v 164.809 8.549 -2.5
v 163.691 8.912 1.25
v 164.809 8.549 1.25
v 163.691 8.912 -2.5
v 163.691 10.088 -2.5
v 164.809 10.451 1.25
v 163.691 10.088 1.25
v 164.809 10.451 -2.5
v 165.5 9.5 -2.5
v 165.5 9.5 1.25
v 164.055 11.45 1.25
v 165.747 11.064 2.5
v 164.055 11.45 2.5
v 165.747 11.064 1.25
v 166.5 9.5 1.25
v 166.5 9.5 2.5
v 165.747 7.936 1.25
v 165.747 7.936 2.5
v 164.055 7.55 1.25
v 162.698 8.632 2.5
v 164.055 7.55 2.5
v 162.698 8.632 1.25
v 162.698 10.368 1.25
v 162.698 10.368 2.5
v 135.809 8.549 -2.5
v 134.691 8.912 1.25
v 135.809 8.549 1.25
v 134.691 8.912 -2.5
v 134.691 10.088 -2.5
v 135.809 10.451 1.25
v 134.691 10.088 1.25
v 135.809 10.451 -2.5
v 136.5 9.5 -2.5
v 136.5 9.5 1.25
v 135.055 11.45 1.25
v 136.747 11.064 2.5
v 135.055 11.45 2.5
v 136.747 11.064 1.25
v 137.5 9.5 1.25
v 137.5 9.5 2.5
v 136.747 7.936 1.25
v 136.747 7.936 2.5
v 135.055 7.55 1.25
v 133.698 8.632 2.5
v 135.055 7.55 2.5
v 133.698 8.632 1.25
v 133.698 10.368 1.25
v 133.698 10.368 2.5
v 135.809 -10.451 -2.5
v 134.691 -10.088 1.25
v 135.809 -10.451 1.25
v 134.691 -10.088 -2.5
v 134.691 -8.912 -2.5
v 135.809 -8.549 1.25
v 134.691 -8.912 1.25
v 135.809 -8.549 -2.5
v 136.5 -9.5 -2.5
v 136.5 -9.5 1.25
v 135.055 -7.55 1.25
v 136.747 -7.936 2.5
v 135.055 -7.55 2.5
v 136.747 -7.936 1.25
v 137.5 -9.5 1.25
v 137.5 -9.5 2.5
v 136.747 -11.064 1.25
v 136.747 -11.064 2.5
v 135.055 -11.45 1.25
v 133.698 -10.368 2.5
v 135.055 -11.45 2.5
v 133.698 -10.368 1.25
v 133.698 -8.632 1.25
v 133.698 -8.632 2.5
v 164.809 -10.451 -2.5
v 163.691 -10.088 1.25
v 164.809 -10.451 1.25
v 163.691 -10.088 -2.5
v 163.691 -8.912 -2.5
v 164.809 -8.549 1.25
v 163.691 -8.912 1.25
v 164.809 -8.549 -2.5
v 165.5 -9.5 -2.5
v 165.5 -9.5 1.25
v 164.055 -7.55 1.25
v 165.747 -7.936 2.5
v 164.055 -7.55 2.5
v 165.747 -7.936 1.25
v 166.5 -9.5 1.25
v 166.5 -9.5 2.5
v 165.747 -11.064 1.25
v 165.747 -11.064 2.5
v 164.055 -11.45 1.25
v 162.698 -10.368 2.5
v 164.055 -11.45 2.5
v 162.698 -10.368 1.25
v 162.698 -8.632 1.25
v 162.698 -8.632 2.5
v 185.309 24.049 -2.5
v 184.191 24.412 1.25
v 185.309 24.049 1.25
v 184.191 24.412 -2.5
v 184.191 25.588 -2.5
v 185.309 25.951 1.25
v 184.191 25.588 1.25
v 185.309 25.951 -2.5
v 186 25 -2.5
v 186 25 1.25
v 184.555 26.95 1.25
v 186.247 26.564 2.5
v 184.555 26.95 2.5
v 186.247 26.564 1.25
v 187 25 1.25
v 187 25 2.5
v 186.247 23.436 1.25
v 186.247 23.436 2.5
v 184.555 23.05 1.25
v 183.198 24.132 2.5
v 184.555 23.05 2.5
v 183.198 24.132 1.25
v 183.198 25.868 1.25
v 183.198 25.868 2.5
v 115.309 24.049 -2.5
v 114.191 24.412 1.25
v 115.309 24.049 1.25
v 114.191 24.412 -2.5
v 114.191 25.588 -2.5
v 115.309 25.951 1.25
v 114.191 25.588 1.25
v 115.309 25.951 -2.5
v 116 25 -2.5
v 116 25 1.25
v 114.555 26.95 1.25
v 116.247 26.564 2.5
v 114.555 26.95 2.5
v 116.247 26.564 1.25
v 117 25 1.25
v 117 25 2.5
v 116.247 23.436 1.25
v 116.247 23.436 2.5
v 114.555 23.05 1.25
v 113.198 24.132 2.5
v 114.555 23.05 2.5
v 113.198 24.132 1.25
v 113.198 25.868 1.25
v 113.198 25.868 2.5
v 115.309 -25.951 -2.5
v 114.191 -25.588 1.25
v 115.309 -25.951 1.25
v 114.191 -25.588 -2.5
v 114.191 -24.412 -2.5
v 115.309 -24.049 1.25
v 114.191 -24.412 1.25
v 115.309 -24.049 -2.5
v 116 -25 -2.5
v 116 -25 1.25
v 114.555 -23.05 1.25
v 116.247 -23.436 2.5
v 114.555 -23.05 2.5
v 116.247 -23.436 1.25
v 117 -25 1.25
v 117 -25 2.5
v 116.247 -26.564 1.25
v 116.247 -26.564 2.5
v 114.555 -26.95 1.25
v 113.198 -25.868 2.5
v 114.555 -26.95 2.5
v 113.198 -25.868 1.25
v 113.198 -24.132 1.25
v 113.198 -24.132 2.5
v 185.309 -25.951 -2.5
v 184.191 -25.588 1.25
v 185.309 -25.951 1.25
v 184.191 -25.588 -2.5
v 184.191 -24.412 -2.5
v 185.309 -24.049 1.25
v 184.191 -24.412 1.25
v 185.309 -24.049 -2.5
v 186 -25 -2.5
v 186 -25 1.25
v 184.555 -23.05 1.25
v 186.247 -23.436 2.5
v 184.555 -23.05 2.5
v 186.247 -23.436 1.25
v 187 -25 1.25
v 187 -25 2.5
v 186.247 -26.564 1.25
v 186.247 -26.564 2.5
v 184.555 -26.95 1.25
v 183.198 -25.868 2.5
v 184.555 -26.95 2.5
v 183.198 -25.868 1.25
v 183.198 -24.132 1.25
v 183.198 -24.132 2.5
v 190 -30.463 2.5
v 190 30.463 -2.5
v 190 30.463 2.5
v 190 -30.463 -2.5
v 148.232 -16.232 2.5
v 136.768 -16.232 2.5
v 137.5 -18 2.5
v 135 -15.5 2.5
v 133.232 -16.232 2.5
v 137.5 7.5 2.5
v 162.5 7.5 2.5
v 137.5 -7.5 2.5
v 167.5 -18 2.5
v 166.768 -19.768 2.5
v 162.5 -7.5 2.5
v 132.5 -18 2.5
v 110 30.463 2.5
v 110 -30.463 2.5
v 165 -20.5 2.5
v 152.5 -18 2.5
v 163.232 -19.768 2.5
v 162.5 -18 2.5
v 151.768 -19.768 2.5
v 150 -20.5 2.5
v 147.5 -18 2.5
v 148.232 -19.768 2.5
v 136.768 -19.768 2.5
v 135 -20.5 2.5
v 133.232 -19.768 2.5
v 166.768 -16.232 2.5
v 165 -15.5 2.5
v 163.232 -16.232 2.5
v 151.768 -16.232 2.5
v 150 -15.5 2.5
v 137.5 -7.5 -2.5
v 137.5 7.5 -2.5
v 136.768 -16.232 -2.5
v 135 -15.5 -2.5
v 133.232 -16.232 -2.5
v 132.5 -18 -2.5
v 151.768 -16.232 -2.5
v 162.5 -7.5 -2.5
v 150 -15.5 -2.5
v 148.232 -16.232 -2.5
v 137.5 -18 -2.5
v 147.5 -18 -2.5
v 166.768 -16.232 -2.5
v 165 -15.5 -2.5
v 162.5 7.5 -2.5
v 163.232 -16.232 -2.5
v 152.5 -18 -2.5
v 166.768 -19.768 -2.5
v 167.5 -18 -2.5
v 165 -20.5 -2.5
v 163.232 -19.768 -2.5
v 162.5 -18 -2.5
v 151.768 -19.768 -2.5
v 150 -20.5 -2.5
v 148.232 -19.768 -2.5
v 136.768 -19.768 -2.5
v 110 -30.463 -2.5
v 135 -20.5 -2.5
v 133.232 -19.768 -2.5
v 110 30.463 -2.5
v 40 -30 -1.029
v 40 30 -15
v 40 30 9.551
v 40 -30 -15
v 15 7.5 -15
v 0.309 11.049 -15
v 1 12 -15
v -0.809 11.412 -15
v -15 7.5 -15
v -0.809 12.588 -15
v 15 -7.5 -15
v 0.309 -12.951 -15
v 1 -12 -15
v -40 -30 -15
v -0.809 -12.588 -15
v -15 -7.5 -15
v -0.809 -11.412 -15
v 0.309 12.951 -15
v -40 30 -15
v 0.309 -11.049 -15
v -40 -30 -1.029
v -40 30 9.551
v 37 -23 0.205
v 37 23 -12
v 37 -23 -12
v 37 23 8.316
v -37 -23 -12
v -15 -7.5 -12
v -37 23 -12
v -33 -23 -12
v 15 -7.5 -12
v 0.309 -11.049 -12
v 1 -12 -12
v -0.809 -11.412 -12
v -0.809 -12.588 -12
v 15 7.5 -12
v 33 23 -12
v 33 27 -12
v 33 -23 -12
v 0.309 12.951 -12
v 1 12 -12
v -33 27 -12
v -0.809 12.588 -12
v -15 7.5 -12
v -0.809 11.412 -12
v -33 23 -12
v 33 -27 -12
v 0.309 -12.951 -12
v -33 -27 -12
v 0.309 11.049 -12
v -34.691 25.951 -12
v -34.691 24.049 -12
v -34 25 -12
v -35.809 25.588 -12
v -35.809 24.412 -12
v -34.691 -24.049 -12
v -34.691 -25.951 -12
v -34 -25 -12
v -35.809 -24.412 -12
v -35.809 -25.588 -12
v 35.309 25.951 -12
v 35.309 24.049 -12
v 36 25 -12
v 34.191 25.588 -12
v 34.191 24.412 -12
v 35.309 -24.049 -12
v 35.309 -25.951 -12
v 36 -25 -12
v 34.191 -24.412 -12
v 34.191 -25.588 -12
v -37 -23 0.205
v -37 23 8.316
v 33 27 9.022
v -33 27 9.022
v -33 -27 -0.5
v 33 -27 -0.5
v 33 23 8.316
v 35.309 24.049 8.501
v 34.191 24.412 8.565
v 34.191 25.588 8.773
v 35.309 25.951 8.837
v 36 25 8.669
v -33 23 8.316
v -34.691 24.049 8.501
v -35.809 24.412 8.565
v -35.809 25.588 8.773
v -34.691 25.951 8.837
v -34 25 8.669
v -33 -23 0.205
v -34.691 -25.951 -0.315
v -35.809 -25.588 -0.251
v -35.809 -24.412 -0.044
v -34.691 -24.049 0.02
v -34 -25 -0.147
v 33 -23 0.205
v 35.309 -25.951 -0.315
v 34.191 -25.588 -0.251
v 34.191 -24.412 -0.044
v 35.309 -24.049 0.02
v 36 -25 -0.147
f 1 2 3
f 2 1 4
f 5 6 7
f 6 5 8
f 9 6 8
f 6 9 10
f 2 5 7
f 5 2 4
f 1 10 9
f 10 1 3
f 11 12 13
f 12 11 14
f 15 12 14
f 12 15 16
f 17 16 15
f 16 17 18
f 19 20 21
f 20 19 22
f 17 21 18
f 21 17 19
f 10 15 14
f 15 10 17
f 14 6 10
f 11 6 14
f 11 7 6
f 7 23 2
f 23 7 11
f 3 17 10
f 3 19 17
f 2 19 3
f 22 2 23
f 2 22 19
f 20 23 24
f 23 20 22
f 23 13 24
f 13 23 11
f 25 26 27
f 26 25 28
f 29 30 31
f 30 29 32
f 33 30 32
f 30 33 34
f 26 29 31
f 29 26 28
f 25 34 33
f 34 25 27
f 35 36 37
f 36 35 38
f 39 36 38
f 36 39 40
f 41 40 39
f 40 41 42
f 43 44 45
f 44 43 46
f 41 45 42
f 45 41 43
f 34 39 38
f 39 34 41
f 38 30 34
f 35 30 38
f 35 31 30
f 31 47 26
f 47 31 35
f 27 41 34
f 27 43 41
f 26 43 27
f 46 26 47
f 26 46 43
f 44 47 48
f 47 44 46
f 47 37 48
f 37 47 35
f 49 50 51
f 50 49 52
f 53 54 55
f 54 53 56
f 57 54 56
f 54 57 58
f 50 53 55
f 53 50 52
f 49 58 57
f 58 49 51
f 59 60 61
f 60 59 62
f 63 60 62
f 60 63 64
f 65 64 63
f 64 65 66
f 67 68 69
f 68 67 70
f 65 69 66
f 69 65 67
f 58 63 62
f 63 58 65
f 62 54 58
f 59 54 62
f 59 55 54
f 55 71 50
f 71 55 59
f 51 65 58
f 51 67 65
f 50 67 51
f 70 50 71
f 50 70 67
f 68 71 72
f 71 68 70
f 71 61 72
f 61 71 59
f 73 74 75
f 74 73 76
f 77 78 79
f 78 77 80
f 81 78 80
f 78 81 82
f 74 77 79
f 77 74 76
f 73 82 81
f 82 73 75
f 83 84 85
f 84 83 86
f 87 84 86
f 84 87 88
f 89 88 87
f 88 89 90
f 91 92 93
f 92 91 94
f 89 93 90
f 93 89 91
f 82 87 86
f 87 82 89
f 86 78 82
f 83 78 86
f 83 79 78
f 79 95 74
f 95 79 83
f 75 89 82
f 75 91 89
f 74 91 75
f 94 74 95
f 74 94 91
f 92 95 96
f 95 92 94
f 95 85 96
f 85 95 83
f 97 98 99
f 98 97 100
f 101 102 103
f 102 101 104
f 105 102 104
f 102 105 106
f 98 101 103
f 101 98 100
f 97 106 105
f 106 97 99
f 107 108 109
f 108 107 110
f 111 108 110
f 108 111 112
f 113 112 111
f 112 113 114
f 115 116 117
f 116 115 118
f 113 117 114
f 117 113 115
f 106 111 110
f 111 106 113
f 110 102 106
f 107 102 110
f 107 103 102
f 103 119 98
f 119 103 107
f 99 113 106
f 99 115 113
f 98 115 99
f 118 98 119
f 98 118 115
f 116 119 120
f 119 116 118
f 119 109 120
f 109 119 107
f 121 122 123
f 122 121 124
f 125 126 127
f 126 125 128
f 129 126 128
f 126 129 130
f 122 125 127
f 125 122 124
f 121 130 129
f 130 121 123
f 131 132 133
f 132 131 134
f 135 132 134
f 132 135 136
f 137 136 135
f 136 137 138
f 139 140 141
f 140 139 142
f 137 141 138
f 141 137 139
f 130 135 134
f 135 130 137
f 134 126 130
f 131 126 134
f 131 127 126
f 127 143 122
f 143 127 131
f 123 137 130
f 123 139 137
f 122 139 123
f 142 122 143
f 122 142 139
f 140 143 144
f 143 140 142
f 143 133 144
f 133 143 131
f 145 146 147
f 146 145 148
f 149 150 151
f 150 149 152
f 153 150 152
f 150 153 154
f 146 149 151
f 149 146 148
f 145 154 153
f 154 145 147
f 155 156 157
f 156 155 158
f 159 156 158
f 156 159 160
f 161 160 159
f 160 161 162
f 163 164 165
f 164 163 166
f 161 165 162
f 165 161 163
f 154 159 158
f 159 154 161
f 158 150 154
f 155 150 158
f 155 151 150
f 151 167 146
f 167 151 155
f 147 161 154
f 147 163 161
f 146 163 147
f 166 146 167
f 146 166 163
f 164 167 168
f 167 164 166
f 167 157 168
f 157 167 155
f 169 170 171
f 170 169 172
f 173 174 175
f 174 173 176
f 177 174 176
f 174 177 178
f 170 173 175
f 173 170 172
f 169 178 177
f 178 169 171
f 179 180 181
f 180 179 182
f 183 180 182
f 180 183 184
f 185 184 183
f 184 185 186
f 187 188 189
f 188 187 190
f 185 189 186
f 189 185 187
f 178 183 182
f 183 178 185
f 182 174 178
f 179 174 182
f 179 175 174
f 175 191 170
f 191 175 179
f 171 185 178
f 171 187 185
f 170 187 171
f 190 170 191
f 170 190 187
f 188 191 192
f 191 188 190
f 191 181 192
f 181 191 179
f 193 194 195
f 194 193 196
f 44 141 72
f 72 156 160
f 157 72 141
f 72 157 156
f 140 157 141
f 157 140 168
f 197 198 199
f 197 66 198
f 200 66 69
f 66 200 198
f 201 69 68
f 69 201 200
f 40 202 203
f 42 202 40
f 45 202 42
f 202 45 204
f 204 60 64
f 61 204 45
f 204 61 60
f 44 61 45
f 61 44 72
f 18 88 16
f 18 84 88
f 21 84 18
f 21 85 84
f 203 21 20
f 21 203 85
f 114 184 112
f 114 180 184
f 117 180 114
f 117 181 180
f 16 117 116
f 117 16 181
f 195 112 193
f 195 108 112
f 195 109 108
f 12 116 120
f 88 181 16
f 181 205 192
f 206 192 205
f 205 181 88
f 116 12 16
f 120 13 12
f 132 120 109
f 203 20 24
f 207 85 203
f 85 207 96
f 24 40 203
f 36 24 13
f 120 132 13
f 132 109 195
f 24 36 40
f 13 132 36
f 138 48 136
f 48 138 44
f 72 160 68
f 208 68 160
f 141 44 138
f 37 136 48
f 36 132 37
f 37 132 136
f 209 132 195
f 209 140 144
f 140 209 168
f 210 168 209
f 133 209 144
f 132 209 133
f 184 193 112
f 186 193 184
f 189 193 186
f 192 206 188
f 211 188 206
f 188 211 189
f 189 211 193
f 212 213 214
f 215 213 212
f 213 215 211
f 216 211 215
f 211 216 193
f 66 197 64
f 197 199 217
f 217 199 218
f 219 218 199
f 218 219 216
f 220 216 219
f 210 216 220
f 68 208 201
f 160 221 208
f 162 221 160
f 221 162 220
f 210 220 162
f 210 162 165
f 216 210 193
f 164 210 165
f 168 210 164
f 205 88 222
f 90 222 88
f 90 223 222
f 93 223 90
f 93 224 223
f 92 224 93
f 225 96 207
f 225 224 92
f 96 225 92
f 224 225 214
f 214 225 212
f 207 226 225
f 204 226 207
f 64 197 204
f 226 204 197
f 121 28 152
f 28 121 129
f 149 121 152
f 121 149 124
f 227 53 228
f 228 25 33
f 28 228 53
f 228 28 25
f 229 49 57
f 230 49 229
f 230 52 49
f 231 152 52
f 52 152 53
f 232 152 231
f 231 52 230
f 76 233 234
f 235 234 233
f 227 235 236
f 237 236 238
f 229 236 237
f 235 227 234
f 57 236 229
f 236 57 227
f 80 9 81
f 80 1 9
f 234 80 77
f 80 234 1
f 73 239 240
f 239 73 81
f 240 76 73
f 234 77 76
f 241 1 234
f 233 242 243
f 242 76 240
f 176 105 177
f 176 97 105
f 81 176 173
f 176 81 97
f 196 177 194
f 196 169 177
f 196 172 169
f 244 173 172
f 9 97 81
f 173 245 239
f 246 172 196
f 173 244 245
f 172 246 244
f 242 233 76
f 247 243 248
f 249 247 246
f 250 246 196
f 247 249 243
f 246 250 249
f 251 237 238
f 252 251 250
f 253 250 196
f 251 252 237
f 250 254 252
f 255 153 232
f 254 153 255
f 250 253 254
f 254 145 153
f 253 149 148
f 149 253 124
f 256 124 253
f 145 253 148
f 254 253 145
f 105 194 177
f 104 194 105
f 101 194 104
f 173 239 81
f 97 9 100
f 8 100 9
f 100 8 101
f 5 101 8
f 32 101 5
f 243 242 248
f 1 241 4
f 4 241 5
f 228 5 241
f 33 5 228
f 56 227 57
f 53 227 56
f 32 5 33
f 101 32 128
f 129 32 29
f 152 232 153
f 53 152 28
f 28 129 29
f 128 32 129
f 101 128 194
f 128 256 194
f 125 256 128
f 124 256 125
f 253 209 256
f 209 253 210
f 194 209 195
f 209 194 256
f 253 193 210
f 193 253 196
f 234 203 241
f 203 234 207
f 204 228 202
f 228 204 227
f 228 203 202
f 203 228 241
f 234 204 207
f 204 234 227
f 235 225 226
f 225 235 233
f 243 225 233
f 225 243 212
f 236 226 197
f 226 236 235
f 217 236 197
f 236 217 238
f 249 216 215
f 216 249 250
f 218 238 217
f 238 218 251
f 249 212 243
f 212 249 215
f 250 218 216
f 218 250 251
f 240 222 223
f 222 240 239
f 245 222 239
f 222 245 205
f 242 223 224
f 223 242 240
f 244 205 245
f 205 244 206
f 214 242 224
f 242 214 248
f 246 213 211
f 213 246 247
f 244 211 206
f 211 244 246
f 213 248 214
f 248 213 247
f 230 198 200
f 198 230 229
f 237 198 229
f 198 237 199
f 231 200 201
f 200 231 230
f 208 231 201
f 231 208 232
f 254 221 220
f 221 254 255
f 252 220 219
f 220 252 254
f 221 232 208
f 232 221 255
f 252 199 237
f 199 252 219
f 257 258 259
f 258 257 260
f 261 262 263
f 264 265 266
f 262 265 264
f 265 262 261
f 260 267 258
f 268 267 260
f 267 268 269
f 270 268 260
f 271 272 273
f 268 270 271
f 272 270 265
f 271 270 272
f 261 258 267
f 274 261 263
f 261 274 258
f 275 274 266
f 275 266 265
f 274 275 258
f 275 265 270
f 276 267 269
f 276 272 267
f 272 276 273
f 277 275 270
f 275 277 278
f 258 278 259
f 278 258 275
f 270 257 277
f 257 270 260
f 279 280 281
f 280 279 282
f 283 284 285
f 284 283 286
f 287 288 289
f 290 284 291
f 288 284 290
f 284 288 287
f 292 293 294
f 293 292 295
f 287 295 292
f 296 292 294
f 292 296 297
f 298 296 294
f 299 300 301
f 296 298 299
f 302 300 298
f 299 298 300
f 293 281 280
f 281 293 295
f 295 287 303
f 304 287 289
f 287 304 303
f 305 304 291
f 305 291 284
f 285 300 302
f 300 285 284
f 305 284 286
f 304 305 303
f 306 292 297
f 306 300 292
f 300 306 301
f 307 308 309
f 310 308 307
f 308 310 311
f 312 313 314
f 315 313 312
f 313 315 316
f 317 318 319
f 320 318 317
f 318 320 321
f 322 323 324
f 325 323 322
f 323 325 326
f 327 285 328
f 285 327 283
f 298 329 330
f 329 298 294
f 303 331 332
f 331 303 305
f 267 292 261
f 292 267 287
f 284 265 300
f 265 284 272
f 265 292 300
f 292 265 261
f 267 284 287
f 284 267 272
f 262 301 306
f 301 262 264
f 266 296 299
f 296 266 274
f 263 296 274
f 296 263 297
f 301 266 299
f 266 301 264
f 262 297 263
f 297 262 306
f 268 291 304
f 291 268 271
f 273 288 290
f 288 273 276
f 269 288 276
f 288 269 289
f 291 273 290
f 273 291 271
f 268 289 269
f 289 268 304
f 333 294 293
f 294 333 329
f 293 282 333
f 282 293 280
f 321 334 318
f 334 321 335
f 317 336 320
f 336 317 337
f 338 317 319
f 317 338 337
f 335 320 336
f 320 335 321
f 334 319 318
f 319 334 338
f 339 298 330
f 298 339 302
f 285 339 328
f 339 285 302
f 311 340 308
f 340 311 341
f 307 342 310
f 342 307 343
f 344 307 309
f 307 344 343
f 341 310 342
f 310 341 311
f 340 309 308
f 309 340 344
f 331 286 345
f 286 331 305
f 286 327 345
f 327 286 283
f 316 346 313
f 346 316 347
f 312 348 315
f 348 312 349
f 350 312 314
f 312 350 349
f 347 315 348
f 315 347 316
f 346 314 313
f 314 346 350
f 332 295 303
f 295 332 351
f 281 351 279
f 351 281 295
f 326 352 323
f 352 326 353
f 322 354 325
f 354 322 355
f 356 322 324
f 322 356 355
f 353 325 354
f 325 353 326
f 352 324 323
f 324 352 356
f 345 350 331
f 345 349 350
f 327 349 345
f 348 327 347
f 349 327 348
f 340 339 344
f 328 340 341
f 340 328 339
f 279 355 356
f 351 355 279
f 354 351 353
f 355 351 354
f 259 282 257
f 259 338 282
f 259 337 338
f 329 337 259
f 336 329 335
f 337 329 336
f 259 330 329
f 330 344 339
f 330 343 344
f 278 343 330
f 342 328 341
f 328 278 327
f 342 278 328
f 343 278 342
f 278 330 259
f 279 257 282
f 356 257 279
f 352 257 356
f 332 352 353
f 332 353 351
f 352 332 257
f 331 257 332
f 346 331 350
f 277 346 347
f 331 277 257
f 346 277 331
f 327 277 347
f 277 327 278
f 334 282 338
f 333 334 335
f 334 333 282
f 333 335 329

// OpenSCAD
//case bottom dimensions
arduino_width=80;
arduino_length=60;
case_height=30;

slope_angle=10;

box_thickness=3;
port_width=30;
port_length=15;
port_height=60;
cap_diameter=30;
mount_pos=(cap_diameter/2)-3;

//case top dimensions
top_height=10;

top_length= arduino_length/cos(slope_angle);


lengthOLED=25;

widthOLED=15;
depthholes=top_height+10;

dbuttons=5;
buttonspace=15;

dOLED_to_butt=-18;

length2hole=40;

height22=16;
width2hole= 30;
heighthole=8;
//screws
dscrews=2;



//Creates screw mounts
module screw_mount(mount_height){
    difference(){
        cube(size=[dscrews+2,dscrews+2,mount_height], center=true);
        cylinder(mount_height+1,dscrews/2,dscrews/2,center=true);
    }
}

//creates cube to cut the box bottom at an angle
module rotated_cube(angle){
    rotate([angle, 0, 0]){
        cube(size=[arduino_width+10,arduino_length+50,case_height+1], center=true);
    }
}

//create bottom
module  createCaseBottom() {
    difference(){
    union(){
        difference(){
            cube(size=[arduino_width,arduino_length,case_height], center=true);
        
            
       
                cube(size=[arduino_width-(2*box_thickness),arduino_length-(2*box_thickness),case_height-(2*box_thickness)], center=true);
        
                cube(size=[port_width,port_length,port_height],center=true);
        
                //mounting screws
                translate([0,mount_pos,0]){
                    cylinder(port_height,dscrews/2,dscrews/2,center=true);
        
                    }
                translate([0,-mount_pos,0]){
                    cylinder(port_height,dscrews/2,dscrews/2,center=true);
        
                }
            }
            //screw mounts
            translate([((arduino_width/2)-(dscrews+2)/2)-box_thickness,((arduino_length/2)-(dscrews+2)/2)-box_thickness,0]){
            screw_mount(case_height);
            }
            translate([-(((arduino_width/2)-(dscrews+2)/2)-box_thickness),((arduino_length/2)-(dscrews+2)/2)-box_thickness,0]){
            screw_mount(case_height);
            }
            translate([-(((arduino_width/2)-(dscrews+2)/2)-box_thickness),-(((arduino_length/2)-(dscrews+2)/2)-box_thickness),0]){
            screw_mount(case_height);
            }
            translate([(((arduino_width/2)-(dscrews+2)/2)-box_thickness),-(((arduino_length/2)-(dscrews+2)/2)-box_thickness),0]){
            screw_mount(case_height);
            }
        }
        translate([0,0,20])
             rotated_cube(slope_angle);
    }
        
}


        
//creates hole for the screw       
module screw_hole(d_of_screw){
     cylinder(depthholes,(d_of_screw)/2,(d_of_screw)/2,center=true);
        
     translate([0,0,2]){
           cylinder(1.5,(d_of_screw+2)/2,(d_of_screw+2)/2,center=true);
     }
     //Todo, Add screw thread
}


module Case_top(){
    difference(){
        cube(size=[arduino_width,top_length,box_thickness+2], center=true);
        
        translate([0,0,0])
                cube(size=[lengthOLED,widthOLED,depthholes], center=true);
     
    //buttons
        translate([0,dOLED_to_butt,0]){
          cylinder(depthholes,dbuttons/2,dbuttons/2,center=true);
        }
        translate([buttonspace,dOLED_to_butt,0]){
          cylinder(depthholes,dbuttons/2,dbuttons/2,center=true);
        }
        
        translate([-buttonspace,dOLED_to_butt,0]){
          cylinder(depthholes,dbuttons/2,dbuttons/2,center=true);
        }
     //OLED screws
         translate([(lengthOLED/2)+2,(widthOLED/2)+2,0]){
          screw_hole(dscrews);
        
        }
        translate([-((lengthOLED/2)+2),(widthOLED/2)+2,0]){
          screw_hole(dscrews);
        
        }
        translate([-((lengthOLED/2)+2),-((widthOLED/2)+2),0]){
          screw_hole(dscrews);
        
        }
        translate([((lengthOLED/2)+2),-((widthOLED/2)+2),0]){
          screw_hole(dscrews);
        
        }
         translate([((arduino_width/2)-(dscrews+2)/2)-box_thickness,((arduino_length/2)-(dscrews+2)/2)-box_thickness,0]){
          screw_hole(dscrews);
        }
       
         translate([-(((arduino_width/2)-(dscrews+2)/2)-box_thickness),((arduino_length/2)-(dscrews+2)/2)-box_thickness,0]){
          screw_hole(dscrews);
        }
        
         translate([-(((arduino_width/2)-(dscrews+2)/2)-box_thickness),-(((arduino_length/2)-(dscrews+2)/2)-box_thickness),0]){
          screw_hole(dscrews);
        }
        
         translate([((arduino_width/2)-(dscrews+2)/2)-box_thickness,-(((arduino_length/2)-(dscrews+2)/2)-box_thickness),0]){
          screw_hole(dscrews);
        }
        
    }
        

}



translate([150,0,0])
//rotate([slope_angle, 0, 0]){
 Case_top();
//}
translate([0,0,0])
 createCaseBottom();
